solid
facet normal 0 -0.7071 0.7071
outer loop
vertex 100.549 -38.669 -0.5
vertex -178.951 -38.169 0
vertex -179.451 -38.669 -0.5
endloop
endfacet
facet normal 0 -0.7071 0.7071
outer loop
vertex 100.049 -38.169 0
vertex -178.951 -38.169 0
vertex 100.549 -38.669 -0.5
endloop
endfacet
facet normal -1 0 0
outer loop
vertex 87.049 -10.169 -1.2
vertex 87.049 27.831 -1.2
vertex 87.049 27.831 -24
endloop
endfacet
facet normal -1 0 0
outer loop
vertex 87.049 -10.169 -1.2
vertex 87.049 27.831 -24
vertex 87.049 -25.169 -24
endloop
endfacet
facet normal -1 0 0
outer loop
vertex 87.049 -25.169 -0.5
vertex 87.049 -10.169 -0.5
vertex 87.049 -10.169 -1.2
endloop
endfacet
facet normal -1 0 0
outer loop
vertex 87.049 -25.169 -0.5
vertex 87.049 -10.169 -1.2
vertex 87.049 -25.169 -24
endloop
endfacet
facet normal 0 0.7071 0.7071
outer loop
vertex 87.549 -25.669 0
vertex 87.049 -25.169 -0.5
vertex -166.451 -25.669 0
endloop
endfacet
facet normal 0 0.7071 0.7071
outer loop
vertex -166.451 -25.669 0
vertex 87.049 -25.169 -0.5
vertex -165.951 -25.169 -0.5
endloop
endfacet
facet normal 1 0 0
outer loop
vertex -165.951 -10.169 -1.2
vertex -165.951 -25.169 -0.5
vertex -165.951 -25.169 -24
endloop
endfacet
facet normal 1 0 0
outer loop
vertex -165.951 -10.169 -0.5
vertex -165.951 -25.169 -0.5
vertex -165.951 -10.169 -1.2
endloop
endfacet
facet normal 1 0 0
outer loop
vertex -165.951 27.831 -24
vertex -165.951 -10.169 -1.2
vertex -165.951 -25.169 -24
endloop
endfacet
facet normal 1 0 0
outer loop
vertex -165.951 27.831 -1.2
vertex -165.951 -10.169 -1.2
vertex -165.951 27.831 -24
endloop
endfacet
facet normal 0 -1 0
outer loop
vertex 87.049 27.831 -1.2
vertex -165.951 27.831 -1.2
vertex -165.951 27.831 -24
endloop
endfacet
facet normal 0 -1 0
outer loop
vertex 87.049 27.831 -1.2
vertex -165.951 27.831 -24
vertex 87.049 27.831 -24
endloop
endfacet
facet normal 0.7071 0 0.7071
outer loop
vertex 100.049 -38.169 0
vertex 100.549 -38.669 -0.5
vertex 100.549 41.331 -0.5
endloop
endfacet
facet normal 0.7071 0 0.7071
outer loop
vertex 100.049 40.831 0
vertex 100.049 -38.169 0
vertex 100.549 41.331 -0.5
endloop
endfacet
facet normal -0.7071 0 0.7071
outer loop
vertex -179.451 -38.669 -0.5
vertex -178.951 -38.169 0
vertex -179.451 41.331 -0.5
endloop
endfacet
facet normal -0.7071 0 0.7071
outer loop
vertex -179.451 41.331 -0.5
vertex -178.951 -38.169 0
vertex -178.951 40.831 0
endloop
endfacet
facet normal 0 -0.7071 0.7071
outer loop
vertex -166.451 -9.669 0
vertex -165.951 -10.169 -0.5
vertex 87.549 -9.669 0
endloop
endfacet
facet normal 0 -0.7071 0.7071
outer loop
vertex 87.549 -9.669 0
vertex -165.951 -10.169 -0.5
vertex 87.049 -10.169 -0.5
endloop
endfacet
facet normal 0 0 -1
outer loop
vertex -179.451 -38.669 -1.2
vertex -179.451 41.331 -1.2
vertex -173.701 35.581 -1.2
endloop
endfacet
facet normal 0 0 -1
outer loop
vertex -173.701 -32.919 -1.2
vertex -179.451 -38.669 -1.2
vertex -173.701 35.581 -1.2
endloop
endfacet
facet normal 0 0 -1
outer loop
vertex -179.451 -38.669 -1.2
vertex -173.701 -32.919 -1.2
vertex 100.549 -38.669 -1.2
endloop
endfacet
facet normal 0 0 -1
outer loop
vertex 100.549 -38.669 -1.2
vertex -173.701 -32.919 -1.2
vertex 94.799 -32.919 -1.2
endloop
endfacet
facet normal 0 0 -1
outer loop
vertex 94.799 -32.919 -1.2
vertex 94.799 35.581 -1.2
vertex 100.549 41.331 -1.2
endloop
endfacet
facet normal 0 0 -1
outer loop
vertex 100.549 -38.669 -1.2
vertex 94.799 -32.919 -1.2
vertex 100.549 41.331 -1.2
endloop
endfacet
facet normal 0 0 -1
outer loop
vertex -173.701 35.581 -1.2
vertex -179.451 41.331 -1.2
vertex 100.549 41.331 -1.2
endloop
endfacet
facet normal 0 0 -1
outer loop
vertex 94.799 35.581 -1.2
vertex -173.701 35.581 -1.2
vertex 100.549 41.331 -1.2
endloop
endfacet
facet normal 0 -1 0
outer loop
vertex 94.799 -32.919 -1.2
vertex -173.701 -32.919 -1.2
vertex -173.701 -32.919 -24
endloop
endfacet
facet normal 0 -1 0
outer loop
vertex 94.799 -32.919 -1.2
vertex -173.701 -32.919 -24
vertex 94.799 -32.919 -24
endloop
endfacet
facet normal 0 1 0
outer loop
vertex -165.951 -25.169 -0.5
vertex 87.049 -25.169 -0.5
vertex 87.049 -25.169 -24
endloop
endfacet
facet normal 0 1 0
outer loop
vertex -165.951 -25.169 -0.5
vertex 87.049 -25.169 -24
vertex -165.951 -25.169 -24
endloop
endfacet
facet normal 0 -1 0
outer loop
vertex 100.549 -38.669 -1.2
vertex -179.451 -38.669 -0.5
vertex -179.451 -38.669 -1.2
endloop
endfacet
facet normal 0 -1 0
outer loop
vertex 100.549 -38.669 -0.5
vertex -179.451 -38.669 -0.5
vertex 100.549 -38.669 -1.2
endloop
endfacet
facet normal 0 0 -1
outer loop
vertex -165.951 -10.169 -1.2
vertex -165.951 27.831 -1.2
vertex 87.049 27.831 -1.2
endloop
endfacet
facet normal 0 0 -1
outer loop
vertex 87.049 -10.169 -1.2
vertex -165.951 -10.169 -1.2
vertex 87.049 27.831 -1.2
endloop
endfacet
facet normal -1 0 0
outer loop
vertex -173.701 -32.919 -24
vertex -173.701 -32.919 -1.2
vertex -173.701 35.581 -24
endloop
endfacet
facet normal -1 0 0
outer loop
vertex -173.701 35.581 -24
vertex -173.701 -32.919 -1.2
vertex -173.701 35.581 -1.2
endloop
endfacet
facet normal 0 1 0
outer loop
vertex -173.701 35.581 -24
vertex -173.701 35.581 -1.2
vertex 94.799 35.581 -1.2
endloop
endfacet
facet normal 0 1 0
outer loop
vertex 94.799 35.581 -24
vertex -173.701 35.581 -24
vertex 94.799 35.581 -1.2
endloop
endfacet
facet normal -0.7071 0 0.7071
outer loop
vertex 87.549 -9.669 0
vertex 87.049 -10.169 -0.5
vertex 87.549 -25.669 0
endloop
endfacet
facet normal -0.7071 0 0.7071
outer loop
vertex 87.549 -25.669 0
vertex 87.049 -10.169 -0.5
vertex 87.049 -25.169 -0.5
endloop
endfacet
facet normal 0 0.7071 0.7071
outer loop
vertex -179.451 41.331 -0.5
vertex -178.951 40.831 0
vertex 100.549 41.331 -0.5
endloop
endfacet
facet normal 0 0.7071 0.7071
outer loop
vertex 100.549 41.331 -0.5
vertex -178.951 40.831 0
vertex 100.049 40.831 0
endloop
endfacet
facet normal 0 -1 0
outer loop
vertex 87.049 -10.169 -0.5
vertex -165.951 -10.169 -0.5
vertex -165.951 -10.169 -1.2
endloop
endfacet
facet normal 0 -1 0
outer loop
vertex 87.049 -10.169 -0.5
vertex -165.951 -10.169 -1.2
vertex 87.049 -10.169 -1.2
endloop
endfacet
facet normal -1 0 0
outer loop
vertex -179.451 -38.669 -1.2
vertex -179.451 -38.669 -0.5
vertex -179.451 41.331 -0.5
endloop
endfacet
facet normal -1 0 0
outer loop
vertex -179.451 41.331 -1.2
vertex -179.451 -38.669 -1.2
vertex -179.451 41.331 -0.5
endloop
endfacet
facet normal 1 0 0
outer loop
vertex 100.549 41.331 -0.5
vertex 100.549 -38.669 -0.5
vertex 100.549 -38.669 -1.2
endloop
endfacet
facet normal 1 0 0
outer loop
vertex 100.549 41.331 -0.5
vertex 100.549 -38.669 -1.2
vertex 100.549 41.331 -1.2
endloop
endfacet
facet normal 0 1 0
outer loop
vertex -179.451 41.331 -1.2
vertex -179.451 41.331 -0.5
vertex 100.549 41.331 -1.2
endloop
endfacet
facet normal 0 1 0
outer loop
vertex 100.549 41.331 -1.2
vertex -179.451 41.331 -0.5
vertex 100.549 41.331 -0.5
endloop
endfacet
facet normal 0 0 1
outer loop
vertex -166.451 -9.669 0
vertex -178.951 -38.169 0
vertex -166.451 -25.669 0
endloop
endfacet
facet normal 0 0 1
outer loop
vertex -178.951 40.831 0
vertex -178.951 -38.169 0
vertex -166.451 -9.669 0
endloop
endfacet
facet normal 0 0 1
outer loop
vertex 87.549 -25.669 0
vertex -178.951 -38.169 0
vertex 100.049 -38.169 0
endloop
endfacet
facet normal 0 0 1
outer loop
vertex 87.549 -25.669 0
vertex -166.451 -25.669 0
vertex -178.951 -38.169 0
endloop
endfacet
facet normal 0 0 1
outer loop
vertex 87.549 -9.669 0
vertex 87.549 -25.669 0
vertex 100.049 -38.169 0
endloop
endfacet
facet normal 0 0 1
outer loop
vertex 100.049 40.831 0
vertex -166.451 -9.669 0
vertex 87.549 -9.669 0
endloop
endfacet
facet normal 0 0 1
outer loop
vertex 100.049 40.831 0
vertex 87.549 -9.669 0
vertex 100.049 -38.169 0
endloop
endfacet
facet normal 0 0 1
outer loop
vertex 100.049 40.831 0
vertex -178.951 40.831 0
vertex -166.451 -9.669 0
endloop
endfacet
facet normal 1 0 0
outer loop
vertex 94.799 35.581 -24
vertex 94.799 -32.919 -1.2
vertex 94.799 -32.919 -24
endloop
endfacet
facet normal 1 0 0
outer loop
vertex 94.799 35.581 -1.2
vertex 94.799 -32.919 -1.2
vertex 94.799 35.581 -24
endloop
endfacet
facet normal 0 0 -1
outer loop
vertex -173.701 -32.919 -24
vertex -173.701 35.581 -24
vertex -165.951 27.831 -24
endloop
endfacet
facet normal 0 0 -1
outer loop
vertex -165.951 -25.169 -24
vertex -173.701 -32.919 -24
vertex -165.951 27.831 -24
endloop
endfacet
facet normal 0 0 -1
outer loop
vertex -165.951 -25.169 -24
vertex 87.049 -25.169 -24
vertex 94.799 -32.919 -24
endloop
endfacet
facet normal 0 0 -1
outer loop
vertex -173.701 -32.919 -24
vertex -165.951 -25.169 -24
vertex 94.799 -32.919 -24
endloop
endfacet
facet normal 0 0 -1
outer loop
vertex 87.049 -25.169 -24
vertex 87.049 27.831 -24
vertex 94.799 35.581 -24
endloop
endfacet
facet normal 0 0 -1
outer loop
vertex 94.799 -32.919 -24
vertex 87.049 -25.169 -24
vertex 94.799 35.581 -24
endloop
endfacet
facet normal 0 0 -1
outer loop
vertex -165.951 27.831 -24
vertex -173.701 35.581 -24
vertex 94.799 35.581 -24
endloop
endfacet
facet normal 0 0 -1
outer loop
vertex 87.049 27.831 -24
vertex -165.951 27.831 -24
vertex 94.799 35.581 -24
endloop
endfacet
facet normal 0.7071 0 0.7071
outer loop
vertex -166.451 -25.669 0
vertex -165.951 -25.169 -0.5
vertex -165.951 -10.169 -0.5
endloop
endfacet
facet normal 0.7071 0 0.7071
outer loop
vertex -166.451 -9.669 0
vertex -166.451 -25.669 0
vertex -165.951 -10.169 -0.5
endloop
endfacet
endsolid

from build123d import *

# Parameters (mm, degrees)
F0_W     = 253
F0_H     = 38
F1_DEPTH = 1.2
F0_W_2   = 280
F0_H_2   = 80
F0_W_3   = 268.5
F0_H_3   = 68.5
F2_DEPTH = 24
F4_SIZE  = 0.5


with BuildPart() as f1:
    # F0 (on Top) → F1 (new body)
    with BuildSketch(Plane.XY):
        with Locations((-39.450533092, 8.8307528198)):
            Rectangle(F0_W, F0_H)
    extrude(amount=-F1_DEPTH)


with BuildPart() as f1b:
    # F0 (on Top) → F1, piece 2 (new body)
    with BuildSketch(Plane.XY):
        with Locations((-39.450533092, 1.3307528198)):
            Rectangle(F0_W_2, F0_H_2)
        with Locations((-39.450533092, 1.3307528198)):
            Rectangle(F0_W_3, F0_H_3, mode=Mode.SUBTRACT)
    extrude(amount=-F1_DEPTH)


with BuildPart() as f2:
    # F0 (on Top) → F2 (new body)
    with BuildSketch(Plane.XY):
        with Locations((-39.450533092, 1.3307528198)):
            Rectangle(F0_W_3, F0_H_3)
        Polygon((-165.950533092, -10.1692471802), (-165.950533092, 27.8307528198), (87.049466908, 27.8307528198), (87.049466908, -10.1692471802), (87.049466908, -25.1692471802), (-165.950533092, -25.1692471802), align=None, mode=Mode.SUBTRACT)
    extrude(amount=-F2_DEPTH)

    # F3: union F1, F1b
    add(f1.part)
    add(f1b.part)

    # F4
    f4_edges = [f2.edges().sort_by_distance(p)[0] for p in [
        (-39.450533, -38.669247, 0),
        (-179.450533, 1.330753, 0),
        (-39.450533, 41.330753, 0),
        (100.549467, 1.330753, 0),
        (-39.450533, -10.169247, 0),
        (87.049467, -17.669247, 0),
        (-39.450533, -25.169247, 0),
        (-165.950533, -17.669247, 0),
    ]]
    chamfer(f4_edges, length=F4_SIZE)


solid = f2.part
